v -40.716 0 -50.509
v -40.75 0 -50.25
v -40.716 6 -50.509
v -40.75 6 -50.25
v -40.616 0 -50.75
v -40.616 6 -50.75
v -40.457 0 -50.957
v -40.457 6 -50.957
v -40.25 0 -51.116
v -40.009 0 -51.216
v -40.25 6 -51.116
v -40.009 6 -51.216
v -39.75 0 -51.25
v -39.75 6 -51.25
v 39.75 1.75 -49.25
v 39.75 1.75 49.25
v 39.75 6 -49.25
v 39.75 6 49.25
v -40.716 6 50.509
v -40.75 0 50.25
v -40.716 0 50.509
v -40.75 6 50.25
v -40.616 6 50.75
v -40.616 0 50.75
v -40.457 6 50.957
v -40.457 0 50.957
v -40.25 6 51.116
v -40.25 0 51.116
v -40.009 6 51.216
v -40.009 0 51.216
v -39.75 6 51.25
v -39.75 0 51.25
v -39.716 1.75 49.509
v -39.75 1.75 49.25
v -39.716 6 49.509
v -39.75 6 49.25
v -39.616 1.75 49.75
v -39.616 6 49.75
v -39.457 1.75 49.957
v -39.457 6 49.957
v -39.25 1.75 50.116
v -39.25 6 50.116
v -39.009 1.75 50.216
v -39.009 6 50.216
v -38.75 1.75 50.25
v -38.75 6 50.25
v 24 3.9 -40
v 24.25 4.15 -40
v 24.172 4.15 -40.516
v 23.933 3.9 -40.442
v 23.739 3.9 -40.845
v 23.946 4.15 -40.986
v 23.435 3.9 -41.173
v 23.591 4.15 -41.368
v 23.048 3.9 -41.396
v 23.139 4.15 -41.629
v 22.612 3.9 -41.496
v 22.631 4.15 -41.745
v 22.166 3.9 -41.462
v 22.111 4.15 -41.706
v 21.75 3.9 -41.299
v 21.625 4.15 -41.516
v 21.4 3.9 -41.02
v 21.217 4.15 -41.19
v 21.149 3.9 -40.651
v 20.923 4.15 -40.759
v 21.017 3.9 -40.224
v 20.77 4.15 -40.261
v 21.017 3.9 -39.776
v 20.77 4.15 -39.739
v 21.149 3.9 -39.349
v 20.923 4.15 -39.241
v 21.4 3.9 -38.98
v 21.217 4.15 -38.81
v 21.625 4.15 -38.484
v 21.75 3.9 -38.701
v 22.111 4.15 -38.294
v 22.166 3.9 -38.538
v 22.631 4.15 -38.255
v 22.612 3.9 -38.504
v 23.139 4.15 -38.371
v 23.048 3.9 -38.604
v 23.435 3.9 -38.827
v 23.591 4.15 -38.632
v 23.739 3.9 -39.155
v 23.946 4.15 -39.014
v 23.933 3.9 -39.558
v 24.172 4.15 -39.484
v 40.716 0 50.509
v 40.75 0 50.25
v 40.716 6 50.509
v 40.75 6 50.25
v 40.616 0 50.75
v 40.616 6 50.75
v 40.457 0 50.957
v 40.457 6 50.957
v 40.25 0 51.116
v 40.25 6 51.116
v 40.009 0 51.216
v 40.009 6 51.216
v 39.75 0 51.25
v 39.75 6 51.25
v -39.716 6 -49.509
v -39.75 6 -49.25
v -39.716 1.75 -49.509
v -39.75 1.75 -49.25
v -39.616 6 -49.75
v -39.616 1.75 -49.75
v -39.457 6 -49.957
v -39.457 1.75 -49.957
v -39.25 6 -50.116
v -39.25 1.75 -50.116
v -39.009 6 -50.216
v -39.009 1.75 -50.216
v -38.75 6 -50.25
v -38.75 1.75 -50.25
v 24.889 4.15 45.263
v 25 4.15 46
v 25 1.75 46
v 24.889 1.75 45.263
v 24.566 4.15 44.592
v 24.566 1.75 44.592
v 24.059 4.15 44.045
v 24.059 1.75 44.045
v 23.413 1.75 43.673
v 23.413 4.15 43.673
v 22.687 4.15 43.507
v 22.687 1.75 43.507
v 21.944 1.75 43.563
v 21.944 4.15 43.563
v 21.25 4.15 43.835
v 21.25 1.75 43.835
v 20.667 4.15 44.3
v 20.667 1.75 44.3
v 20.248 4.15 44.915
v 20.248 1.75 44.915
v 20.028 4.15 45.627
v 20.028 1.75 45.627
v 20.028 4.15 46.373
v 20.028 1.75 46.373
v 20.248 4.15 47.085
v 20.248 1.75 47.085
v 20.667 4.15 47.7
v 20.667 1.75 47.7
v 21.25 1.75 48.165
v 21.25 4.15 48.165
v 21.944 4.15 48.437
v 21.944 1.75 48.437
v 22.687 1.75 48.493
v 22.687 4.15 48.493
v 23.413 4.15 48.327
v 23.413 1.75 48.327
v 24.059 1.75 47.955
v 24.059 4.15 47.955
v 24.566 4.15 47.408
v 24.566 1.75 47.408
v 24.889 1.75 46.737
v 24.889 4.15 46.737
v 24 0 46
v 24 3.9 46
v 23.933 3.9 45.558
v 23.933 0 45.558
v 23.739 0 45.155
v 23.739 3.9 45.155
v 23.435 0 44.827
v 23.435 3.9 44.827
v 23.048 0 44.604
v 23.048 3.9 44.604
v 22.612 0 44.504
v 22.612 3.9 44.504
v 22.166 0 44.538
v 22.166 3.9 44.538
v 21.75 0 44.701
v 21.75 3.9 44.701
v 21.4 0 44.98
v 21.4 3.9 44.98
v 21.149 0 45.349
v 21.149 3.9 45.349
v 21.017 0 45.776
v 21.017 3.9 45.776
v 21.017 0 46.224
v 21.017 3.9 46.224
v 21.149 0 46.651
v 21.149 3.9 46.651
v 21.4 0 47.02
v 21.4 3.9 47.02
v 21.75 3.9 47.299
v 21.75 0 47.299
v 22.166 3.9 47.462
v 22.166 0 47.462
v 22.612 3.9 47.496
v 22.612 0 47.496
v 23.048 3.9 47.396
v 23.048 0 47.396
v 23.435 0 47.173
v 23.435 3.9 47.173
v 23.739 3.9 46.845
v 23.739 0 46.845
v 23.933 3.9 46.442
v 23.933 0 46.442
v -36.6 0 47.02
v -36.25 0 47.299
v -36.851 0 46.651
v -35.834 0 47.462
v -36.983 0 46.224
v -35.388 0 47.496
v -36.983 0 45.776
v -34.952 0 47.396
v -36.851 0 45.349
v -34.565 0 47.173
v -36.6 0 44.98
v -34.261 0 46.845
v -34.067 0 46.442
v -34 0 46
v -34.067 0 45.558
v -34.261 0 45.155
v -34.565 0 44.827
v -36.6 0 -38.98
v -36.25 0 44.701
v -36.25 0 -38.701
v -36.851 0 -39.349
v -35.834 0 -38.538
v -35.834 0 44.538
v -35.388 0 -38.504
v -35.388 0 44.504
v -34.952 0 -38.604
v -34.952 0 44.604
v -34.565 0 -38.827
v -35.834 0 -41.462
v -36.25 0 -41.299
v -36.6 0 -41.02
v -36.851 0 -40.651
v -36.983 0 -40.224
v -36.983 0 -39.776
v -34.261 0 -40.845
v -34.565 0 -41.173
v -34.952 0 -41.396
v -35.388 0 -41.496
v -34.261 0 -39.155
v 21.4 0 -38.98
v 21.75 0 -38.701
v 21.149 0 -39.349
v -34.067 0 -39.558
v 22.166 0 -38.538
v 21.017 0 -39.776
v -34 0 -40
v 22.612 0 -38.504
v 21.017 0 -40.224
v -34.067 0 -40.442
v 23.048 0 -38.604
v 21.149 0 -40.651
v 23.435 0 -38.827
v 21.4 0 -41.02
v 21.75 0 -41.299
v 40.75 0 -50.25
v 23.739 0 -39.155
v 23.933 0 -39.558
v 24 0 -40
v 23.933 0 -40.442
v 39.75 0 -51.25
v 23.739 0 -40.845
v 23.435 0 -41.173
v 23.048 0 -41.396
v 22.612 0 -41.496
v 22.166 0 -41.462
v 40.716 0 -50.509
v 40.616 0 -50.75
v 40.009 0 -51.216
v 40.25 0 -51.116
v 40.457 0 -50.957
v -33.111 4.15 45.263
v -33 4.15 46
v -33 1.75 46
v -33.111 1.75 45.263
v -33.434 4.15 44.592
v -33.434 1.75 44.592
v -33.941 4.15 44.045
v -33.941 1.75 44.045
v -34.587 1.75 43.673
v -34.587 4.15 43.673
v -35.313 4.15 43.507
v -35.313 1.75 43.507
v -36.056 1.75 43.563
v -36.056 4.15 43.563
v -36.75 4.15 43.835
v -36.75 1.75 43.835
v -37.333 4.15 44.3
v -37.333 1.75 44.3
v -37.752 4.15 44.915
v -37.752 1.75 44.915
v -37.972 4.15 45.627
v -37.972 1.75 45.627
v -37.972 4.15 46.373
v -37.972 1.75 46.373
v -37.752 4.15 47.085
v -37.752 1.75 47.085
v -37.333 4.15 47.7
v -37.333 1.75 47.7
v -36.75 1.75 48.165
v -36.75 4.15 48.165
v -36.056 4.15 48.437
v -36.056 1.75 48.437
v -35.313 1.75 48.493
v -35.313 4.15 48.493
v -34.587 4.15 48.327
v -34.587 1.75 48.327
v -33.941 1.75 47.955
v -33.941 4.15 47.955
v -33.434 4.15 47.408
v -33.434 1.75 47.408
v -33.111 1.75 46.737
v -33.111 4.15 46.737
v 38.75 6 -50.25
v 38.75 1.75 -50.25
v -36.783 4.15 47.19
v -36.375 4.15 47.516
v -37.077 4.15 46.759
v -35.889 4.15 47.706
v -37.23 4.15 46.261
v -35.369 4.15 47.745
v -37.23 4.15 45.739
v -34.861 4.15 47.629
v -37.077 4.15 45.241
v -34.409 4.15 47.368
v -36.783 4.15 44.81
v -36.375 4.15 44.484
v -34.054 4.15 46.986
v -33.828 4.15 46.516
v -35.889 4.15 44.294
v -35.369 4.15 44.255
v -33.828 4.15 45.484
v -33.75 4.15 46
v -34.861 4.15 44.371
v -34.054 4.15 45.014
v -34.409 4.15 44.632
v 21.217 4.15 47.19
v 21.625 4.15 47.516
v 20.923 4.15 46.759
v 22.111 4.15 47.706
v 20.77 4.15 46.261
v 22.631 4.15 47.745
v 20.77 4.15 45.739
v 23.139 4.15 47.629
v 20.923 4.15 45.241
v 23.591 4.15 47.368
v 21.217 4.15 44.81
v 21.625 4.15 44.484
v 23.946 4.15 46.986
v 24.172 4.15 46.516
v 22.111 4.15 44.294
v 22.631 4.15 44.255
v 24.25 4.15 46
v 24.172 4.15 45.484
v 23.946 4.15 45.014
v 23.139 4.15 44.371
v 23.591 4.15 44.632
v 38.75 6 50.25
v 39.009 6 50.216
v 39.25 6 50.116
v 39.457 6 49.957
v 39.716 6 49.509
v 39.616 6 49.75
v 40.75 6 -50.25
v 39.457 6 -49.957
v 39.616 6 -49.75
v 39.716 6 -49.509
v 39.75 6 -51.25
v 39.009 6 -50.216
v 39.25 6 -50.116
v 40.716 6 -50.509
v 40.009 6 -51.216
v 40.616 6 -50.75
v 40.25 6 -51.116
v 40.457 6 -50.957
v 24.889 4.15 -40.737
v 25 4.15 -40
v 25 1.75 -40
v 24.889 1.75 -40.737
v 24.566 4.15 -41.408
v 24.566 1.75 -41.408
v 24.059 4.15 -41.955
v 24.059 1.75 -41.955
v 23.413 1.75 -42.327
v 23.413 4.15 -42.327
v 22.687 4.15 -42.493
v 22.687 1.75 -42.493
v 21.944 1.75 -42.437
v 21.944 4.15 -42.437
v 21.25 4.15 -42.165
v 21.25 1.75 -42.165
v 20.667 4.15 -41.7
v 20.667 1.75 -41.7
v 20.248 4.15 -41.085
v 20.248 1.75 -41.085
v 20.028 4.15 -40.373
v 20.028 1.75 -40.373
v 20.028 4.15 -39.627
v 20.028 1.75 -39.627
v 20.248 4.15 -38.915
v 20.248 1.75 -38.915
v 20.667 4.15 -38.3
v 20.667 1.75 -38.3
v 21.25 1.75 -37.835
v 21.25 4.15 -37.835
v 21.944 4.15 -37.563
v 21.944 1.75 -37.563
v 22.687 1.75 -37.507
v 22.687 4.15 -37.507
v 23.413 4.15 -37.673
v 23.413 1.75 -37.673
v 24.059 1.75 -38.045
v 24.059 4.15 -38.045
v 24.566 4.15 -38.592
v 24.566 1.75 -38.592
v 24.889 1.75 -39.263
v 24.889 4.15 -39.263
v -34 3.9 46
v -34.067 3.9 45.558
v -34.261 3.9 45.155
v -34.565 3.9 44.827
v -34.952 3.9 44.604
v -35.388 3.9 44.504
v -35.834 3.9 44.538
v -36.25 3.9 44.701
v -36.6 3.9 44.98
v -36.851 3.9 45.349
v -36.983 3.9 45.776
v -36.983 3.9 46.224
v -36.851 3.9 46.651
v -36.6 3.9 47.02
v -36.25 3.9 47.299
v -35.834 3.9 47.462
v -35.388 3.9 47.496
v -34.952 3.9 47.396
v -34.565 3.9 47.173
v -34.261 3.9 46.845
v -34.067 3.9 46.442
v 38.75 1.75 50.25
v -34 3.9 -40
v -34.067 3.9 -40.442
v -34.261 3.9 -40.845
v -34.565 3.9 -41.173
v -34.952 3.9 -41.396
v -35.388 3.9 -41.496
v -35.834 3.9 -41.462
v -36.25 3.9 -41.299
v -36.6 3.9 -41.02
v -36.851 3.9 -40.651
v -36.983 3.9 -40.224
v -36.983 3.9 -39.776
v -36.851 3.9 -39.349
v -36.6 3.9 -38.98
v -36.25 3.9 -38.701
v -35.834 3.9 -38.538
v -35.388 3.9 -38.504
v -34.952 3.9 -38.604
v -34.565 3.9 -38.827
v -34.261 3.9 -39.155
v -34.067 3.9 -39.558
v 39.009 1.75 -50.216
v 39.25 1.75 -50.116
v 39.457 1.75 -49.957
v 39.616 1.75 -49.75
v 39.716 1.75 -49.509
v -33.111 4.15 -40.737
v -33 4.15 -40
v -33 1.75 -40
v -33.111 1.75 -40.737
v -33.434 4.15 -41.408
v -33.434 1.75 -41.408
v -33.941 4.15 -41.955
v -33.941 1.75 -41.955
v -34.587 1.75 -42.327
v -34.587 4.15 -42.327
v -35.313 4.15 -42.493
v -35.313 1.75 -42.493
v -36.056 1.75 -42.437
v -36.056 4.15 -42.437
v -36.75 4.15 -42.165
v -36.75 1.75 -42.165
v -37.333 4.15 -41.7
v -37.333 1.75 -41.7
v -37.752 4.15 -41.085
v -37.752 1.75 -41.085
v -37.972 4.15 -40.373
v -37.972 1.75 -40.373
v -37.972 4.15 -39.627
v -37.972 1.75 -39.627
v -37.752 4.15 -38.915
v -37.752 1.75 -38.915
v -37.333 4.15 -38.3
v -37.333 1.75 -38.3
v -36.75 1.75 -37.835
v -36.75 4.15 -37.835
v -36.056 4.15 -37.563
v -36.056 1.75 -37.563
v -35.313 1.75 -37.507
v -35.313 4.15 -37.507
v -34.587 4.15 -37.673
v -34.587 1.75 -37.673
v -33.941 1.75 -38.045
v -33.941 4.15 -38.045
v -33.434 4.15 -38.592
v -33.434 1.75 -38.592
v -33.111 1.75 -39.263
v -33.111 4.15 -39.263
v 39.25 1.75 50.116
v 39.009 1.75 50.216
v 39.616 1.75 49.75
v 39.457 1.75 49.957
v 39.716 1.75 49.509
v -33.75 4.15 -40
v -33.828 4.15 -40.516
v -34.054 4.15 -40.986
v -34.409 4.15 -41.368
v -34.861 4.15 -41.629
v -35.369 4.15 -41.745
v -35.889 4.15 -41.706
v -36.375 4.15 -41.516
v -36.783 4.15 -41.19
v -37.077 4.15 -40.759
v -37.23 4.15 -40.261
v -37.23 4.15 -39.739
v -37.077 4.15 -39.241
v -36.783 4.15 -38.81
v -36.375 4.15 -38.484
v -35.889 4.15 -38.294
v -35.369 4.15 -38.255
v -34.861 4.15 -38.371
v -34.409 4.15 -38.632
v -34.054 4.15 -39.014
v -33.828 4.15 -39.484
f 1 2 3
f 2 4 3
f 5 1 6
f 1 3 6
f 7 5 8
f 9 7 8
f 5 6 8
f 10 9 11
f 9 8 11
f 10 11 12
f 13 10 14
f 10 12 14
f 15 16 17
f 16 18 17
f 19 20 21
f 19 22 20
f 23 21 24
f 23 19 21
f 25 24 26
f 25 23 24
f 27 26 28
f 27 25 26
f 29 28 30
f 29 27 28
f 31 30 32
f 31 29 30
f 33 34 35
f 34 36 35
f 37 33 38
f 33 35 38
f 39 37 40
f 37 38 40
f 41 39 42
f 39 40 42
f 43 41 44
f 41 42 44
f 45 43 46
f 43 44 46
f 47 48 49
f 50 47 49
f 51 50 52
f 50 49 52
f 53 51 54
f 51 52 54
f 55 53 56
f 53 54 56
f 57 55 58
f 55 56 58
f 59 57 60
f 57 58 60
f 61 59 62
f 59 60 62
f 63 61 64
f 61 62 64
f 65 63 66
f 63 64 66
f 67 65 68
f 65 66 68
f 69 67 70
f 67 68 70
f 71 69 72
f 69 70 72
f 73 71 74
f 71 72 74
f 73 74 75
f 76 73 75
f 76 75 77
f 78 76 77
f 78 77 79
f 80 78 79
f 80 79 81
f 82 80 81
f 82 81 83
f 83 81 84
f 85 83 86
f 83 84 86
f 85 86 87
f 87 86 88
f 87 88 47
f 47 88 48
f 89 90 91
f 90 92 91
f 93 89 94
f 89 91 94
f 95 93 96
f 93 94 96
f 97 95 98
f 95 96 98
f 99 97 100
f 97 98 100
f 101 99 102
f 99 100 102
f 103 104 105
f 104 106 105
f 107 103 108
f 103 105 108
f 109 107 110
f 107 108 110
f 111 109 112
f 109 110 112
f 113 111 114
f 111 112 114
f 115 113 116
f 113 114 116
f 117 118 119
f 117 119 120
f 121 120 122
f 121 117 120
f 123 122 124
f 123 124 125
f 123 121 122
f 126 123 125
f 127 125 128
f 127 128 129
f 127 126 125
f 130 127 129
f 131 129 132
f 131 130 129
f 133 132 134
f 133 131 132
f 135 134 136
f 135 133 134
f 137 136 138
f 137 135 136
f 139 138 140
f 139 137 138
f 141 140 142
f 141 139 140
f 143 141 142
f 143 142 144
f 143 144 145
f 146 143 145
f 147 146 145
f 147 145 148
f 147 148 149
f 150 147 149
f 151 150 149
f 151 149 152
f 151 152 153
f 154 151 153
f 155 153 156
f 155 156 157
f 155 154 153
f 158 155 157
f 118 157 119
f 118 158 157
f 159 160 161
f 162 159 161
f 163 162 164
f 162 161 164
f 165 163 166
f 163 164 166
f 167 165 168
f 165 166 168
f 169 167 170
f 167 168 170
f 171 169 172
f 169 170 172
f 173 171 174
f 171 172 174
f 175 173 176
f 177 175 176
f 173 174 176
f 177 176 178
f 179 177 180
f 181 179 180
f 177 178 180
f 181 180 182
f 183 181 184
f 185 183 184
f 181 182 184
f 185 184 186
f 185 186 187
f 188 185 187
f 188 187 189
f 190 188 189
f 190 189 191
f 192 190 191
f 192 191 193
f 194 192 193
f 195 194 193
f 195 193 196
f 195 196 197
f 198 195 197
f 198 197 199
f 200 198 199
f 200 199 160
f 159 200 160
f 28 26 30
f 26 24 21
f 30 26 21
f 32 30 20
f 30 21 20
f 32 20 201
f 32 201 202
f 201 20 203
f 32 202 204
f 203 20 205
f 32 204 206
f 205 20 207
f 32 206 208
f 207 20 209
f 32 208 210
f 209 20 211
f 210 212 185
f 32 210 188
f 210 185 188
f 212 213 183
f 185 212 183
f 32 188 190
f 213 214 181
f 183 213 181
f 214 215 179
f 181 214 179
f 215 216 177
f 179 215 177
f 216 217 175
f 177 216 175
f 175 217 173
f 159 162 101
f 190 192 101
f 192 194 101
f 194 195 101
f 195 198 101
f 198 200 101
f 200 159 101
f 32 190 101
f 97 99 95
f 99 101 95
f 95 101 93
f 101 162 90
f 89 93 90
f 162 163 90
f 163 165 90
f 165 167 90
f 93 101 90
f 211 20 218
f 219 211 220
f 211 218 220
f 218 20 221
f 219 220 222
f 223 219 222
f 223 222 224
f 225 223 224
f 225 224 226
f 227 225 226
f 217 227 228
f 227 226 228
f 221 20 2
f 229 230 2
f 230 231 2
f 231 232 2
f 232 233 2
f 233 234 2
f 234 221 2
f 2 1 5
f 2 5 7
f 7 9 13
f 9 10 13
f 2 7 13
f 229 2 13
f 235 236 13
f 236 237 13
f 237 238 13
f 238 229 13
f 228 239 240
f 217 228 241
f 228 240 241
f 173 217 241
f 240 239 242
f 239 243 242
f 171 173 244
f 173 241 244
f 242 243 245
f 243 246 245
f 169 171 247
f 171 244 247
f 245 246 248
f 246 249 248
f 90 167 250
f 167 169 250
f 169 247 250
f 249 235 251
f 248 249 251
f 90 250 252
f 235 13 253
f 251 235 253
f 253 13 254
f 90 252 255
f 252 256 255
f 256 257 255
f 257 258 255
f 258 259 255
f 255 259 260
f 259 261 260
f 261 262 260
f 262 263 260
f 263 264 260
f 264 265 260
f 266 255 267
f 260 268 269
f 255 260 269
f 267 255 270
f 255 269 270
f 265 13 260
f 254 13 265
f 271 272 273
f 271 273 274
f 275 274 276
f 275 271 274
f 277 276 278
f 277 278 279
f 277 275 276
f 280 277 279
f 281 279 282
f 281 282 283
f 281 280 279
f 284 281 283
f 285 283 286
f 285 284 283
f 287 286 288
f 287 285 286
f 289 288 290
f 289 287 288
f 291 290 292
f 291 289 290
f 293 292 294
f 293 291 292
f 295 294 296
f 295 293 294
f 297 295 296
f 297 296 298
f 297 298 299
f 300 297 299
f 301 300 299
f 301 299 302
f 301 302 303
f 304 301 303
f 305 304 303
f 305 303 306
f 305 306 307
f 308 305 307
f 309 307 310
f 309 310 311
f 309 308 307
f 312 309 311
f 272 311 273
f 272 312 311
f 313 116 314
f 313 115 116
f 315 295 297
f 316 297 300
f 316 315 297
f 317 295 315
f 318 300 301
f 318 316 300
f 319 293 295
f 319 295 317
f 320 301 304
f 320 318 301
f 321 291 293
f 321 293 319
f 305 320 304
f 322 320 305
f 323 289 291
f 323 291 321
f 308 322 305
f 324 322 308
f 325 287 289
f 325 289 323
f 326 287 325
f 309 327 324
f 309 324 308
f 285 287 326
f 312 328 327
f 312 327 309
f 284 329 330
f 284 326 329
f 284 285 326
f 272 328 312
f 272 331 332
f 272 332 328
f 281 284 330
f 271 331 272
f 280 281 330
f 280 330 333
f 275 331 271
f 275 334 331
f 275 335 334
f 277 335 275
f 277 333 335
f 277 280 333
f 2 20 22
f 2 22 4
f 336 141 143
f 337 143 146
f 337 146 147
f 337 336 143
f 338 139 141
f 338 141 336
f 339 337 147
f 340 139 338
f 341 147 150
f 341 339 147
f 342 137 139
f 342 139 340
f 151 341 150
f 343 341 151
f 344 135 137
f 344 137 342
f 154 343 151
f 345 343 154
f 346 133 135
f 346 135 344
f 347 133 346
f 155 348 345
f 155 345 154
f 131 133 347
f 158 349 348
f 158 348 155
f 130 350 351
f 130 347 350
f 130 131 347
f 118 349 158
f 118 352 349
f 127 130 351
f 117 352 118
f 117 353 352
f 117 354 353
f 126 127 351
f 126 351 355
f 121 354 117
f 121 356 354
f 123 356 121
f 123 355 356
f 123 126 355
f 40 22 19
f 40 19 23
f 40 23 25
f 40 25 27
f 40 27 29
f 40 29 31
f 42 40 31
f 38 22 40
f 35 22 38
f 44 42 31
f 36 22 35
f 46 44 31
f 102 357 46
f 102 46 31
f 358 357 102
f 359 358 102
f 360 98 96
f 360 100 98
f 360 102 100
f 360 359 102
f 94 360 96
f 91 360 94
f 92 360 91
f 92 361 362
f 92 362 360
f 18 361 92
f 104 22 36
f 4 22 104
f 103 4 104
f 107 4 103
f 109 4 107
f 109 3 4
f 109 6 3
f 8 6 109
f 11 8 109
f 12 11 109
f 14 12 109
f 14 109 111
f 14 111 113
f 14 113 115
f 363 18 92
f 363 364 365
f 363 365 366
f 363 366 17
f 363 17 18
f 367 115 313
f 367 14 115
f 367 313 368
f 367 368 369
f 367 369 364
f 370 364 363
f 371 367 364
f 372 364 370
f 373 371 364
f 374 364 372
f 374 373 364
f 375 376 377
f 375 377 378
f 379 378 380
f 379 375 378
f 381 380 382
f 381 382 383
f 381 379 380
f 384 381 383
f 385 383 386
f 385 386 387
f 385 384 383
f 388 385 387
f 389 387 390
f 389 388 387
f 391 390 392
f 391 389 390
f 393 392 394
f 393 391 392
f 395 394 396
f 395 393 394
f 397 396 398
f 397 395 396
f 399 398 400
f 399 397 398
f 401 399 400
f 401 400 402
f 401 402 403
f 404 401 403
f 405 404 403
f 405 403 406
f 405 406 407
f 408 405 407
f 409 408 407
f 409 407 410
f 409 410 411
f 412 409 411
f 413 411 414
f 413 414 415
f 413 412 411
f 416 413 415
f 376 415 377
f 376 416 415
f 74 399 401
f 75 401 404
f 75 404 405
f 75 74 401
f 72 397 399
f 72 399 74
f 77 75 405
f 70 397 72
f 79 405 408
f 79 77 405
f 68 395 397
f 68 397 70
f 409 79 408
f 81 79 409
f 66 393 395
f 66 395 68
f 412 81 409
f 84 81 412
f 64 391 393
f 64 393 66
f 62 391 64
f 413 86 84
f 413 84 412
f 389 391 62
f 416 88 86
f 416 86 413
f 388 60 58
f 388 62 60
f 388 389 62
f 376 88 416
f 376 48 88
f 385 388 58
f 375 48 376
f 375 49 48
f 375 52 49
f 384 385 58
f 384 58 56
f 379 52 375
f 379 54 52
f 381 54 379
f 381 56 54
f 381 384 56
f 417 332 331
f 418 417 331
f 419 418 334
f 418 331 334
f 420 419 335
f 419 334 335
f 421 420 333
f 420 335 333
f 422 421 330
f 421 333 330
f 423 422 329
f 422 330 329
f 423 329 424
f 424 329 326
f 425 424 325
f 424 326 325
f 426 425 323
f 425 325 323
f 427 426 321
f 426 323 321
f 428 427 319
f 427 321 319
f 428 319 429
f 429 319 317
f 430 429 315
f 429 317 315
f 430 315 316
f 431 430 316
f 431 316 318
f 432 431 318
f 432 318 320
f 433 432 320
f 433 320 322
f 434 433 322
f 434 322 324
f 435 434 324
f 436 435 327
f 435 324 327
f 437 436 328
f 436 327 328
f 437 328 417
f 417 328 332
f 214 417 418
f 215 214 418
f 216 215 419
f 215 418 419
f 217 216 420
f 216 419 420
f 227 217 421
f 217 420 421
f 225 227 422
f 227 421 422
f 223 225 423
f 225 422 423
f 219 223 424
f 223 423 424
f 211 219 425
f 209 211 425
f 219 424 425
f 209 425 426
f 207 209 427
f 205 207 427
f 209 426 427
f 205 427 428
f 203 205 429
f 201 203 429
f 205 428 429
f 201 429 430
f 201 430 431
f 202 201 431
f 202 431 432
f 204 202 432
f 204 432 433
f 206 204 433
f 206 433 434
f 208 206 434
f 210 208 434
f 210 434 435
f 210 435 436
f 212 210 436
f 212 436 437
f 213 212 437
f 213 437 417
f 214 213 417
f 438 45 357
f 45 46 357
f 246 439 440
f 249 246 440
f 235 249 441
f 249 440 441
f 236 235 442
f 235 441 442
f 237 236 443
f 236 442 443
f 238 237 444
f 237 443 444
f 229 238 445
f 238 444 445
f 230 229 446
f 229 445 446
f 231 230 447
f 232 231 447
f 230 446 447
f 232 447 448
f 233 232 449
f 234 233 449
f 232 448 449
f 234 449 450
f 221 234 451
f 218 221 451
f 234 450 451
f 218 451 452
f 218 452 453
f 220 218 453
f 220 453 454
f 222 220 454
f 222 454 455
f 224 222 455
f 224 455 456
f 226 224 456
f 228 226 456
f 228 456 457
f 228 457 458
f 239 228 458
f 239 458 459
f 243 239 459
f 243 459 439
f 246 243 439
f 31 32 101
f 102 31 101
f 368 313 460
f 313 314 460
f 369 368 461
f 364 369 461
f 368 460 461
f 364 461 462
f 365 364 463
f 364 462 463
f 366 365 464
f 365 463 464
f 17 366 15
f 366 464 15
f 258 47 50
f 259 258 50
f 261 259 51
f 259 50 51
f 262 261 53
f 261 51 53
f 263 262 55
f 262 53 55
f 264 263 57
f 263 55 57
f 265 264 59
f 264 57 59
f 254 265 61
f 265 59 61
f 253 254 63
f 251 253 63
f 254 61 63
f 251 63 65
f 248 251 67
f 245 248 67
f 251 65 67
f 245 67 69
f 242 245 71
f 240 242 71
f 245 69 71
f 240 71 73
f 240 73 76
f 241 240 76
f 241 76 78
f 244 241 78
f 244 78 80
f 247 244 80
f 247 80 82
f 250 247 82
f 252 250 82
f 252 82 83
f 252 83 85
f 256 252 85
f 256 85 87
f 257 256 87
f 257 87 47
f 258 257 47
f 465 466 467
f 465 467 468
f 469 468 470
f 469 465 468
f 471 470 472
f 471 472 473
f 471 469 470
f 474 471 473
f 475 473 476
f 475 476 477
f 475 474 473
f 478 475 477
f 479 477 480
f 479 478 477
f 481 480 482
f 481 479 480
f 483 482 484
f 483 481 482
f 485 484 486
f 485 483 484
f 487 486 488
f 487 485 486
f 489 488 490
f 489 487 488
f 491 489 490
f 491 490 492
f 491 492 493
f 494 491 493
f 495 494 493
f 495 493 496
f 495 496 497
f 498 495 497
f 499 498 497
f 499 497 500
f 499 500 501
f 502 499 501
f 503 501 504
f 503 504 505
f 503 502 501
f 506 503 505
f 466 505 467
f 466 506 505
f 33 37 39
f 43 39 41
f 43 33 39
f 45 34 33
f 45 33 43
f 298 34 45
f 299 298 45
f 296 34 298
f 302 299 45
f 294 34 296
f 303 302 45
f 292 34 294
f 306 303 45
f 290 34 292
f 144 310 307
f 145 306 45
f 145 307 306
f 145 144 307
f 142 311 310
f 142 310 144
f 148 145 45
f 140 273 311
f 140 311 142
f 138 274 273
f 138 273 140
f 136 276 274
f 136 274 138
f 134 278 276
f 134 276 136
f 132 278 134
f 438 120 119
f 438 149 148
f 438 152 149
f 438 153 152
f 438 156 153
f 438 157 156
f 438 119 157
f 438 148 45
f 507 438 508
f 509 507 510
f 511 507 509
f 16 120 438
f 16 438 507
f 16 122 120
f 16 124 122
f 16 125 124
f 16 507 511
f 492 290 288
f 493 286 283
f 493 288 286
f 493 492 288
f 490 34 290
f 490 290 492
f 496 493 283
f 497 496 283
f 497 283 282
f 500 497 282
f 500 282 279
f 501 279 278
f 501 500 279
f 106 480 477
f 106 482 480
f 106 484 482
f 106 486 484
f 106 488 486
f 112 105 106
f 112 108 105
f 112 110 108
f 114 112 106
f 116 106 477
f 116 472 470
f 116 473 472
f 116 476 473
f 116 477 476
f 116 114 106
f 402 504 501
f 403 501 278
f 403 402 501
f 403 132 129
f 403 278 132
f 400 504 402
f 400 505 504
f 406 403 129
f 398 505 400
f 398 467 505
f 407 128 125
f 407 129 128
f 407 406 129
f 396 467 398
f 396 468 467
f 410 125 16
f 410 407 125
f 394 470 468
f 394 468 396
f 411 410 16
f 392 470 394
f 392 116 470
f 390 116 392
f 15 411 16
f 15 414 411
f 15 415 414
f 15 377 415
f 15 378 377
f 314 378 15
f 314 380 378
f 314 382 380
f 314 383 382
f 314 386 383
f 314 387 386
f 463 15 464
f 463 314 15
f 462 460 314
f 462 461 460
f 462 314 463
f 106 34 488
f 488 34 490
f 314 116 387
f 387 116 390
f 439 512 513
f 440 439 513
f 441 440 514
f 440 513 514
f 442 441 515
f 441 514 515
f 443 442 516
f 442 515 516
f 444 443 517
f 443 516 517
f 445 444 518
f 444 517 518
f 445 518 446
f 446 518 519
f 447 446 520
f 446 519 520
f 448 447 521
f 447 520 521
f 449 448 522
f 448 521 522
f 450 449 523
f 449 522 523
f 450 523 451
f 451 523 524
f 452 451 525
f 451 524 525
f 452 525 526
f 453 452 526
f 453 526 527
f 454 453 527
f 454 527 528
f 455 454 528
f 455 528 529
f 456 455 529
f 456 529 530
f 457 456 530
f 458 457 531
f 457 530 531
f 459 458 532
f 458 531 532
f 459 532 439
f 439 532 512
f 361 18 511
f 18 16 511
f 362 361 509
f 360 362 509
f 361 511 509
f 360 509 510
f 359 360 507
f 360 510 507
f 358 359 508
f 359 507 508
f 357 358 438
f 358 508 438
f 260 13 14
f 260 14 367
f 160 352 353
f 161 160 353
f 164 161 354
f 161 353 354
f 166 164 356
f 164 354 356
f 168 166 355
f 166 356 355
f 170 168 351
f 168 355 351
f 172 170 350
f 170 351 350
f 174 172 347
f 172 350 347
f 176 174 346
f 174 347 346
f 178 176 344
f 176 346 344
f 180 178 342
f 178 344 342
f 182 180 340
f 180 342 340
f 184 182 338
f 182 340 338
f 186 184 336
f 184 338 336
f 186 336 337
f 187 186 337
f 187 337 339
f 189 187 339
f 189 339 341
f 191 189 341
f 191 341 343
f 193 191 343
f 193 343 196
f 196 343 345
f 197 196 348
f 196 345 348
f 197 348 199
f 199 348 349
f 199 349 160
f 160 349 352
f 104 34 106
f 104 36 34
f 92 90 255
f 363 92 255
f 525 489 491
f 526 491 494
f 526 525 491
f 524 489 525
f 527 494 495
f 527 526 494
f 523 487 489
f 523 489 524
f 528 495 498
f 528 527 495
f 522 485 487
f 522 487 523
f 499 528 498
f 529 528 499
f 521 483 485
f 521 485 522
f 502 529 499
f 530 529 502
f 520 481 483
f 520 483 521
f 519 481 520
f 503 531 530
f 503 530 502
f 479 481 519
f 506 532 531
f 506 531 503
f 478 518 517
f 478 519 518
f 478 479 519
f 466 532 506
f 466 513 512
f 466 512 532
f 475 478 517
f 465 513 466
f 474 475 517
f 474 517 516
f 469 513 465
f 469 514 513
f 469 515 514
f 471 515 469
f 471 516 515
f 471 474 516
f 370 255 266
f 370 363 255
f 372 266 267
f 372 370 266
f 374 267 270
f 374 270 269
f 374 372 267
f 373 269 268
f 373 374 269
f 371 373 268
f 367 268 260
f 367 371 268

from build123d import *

# Parameters (mm, degrees)
SKETCH1_W           = 81.5
SKETCH1_H           = 102.5
BOSS_EXTRUDE1_DEPTH = 6
SKETCH2_R           = 1.5
CUT_EXTRUDE1_DEPTH  = 7
SKETCH7_W           = 79.5
SKETCH7_H           = 100.5
CUT_EXTRUDE3_DEPTH  = 1.85
SKETCH8_W           = 79.5
SKETCH8_H           = 100.5
SKETCH8_R           = 2.5
CUT_EXTRUDE4_DEPTH  = 2.4
FILLET1_R           = 1
CHAMFER1_SIZE       = 0.25


with BuildPart() as part:
    # Sketch1 → Boss-Extrude1 (new body)
    with BuildSketch(Plane(origin=(0, 0, 0), x_dir=(1, 0, 0), z_dir=(0, 1, 0))):
        Rectangle(SKETCH1_W, SKETCH1_H)
    extrude(amount=BOSS_EXTRUDE1_DEPTH)

    # Sketch2 → Cut-Extrude1 (cut, through all)
    with BuildSketch(Plane(origin=(0, 6, 0), x_dir=(1, 0, 0), z_dir=(0, 1, 0))):
        with Locations((-35.5, -46)):
            Circle(SKETCH2_R)
        with Locations((-35.5, 40)):
            Circle(SKETCH2_R)
        with Locations((22.5, -46)):
            Circle(SKETCH2_R)
        with Locations((22.5, 40)):
            Circle(SKETCH2_R)
    extrude(amount=-CUT_EXTRUDE1_DEPTH, mode=Mode.SUBTRACT)

    # Sketch7 → Cut-Extrude3 (cut)
    with BuildSketch(Plane(origin=(0, 6, 0), x_dir=(1, 0, 0), z_dir=(0, 1, 0))):
        Rectangle(SKETCH7_W, SKETCH7_H)
    extrude(amount=-CUT_EXTRUDE3_DEPTH, mode=Mode.SUBTRACT)

    # Sketch8 → Cut-Extrude4 (cut)
    with BuildSketch(Plane(origin=(0, 4.15, 0), x_dir=(1, 0, 0), z_dir=(0, 1, 0))):
        Rectangle(SKETCH8_W, SKETCH8_H)
        with Locations((-35.5, 40)):
            Circle(SKETCH8_R, mode=Mode.SUBTRACT)
        with Locations((22.5, 40)):
            Circle(SKETCH8_R, mode=Mode.SUBTRACT)
        with Locations((-35.5, -46)):
            Circle(SKETCH8_R, mode=Mode.SUBTRACT)
        with Locations((22.5, -46)):
            Circle(SKETCH8_R, mode=Mode.SUBTRACT)
    extrude(amount=-CUT_EXTRUDE4_DEPTH, mode=Mode.SUBTRACT)

    # Fillet1
    fillet1_edges = [part.edges().sort_by_distance(p)[0] for p in [
        (-39.75, 3.875, 50.25),
        (-39.75, 3.875, -50.25),
        (39.75, 3.875, -50.25),
        (39.75, 3.875, 50.25),
        (-40.75, 3, 51.25),
        (-40.75, 3, -51.25),
        (40.75, 3, -51.25),
        (40.75, 3, 51.25),
    ]]
    fillet(fillet1_edges, radius=FILLET1_R)

    # Chamfer1
    chamfer1_edges = [part.edges().sort_by_distance(p)[0] for p in [
        (-37, 4.15, 46),
        (21, 4.15, -40),
        (21, 4.15, 46),
        (-37, 4.15, -40),
    ]]
    chamfer(chamfer1_edges, length=CHAMFER1_SIZE)


solid = part.part
